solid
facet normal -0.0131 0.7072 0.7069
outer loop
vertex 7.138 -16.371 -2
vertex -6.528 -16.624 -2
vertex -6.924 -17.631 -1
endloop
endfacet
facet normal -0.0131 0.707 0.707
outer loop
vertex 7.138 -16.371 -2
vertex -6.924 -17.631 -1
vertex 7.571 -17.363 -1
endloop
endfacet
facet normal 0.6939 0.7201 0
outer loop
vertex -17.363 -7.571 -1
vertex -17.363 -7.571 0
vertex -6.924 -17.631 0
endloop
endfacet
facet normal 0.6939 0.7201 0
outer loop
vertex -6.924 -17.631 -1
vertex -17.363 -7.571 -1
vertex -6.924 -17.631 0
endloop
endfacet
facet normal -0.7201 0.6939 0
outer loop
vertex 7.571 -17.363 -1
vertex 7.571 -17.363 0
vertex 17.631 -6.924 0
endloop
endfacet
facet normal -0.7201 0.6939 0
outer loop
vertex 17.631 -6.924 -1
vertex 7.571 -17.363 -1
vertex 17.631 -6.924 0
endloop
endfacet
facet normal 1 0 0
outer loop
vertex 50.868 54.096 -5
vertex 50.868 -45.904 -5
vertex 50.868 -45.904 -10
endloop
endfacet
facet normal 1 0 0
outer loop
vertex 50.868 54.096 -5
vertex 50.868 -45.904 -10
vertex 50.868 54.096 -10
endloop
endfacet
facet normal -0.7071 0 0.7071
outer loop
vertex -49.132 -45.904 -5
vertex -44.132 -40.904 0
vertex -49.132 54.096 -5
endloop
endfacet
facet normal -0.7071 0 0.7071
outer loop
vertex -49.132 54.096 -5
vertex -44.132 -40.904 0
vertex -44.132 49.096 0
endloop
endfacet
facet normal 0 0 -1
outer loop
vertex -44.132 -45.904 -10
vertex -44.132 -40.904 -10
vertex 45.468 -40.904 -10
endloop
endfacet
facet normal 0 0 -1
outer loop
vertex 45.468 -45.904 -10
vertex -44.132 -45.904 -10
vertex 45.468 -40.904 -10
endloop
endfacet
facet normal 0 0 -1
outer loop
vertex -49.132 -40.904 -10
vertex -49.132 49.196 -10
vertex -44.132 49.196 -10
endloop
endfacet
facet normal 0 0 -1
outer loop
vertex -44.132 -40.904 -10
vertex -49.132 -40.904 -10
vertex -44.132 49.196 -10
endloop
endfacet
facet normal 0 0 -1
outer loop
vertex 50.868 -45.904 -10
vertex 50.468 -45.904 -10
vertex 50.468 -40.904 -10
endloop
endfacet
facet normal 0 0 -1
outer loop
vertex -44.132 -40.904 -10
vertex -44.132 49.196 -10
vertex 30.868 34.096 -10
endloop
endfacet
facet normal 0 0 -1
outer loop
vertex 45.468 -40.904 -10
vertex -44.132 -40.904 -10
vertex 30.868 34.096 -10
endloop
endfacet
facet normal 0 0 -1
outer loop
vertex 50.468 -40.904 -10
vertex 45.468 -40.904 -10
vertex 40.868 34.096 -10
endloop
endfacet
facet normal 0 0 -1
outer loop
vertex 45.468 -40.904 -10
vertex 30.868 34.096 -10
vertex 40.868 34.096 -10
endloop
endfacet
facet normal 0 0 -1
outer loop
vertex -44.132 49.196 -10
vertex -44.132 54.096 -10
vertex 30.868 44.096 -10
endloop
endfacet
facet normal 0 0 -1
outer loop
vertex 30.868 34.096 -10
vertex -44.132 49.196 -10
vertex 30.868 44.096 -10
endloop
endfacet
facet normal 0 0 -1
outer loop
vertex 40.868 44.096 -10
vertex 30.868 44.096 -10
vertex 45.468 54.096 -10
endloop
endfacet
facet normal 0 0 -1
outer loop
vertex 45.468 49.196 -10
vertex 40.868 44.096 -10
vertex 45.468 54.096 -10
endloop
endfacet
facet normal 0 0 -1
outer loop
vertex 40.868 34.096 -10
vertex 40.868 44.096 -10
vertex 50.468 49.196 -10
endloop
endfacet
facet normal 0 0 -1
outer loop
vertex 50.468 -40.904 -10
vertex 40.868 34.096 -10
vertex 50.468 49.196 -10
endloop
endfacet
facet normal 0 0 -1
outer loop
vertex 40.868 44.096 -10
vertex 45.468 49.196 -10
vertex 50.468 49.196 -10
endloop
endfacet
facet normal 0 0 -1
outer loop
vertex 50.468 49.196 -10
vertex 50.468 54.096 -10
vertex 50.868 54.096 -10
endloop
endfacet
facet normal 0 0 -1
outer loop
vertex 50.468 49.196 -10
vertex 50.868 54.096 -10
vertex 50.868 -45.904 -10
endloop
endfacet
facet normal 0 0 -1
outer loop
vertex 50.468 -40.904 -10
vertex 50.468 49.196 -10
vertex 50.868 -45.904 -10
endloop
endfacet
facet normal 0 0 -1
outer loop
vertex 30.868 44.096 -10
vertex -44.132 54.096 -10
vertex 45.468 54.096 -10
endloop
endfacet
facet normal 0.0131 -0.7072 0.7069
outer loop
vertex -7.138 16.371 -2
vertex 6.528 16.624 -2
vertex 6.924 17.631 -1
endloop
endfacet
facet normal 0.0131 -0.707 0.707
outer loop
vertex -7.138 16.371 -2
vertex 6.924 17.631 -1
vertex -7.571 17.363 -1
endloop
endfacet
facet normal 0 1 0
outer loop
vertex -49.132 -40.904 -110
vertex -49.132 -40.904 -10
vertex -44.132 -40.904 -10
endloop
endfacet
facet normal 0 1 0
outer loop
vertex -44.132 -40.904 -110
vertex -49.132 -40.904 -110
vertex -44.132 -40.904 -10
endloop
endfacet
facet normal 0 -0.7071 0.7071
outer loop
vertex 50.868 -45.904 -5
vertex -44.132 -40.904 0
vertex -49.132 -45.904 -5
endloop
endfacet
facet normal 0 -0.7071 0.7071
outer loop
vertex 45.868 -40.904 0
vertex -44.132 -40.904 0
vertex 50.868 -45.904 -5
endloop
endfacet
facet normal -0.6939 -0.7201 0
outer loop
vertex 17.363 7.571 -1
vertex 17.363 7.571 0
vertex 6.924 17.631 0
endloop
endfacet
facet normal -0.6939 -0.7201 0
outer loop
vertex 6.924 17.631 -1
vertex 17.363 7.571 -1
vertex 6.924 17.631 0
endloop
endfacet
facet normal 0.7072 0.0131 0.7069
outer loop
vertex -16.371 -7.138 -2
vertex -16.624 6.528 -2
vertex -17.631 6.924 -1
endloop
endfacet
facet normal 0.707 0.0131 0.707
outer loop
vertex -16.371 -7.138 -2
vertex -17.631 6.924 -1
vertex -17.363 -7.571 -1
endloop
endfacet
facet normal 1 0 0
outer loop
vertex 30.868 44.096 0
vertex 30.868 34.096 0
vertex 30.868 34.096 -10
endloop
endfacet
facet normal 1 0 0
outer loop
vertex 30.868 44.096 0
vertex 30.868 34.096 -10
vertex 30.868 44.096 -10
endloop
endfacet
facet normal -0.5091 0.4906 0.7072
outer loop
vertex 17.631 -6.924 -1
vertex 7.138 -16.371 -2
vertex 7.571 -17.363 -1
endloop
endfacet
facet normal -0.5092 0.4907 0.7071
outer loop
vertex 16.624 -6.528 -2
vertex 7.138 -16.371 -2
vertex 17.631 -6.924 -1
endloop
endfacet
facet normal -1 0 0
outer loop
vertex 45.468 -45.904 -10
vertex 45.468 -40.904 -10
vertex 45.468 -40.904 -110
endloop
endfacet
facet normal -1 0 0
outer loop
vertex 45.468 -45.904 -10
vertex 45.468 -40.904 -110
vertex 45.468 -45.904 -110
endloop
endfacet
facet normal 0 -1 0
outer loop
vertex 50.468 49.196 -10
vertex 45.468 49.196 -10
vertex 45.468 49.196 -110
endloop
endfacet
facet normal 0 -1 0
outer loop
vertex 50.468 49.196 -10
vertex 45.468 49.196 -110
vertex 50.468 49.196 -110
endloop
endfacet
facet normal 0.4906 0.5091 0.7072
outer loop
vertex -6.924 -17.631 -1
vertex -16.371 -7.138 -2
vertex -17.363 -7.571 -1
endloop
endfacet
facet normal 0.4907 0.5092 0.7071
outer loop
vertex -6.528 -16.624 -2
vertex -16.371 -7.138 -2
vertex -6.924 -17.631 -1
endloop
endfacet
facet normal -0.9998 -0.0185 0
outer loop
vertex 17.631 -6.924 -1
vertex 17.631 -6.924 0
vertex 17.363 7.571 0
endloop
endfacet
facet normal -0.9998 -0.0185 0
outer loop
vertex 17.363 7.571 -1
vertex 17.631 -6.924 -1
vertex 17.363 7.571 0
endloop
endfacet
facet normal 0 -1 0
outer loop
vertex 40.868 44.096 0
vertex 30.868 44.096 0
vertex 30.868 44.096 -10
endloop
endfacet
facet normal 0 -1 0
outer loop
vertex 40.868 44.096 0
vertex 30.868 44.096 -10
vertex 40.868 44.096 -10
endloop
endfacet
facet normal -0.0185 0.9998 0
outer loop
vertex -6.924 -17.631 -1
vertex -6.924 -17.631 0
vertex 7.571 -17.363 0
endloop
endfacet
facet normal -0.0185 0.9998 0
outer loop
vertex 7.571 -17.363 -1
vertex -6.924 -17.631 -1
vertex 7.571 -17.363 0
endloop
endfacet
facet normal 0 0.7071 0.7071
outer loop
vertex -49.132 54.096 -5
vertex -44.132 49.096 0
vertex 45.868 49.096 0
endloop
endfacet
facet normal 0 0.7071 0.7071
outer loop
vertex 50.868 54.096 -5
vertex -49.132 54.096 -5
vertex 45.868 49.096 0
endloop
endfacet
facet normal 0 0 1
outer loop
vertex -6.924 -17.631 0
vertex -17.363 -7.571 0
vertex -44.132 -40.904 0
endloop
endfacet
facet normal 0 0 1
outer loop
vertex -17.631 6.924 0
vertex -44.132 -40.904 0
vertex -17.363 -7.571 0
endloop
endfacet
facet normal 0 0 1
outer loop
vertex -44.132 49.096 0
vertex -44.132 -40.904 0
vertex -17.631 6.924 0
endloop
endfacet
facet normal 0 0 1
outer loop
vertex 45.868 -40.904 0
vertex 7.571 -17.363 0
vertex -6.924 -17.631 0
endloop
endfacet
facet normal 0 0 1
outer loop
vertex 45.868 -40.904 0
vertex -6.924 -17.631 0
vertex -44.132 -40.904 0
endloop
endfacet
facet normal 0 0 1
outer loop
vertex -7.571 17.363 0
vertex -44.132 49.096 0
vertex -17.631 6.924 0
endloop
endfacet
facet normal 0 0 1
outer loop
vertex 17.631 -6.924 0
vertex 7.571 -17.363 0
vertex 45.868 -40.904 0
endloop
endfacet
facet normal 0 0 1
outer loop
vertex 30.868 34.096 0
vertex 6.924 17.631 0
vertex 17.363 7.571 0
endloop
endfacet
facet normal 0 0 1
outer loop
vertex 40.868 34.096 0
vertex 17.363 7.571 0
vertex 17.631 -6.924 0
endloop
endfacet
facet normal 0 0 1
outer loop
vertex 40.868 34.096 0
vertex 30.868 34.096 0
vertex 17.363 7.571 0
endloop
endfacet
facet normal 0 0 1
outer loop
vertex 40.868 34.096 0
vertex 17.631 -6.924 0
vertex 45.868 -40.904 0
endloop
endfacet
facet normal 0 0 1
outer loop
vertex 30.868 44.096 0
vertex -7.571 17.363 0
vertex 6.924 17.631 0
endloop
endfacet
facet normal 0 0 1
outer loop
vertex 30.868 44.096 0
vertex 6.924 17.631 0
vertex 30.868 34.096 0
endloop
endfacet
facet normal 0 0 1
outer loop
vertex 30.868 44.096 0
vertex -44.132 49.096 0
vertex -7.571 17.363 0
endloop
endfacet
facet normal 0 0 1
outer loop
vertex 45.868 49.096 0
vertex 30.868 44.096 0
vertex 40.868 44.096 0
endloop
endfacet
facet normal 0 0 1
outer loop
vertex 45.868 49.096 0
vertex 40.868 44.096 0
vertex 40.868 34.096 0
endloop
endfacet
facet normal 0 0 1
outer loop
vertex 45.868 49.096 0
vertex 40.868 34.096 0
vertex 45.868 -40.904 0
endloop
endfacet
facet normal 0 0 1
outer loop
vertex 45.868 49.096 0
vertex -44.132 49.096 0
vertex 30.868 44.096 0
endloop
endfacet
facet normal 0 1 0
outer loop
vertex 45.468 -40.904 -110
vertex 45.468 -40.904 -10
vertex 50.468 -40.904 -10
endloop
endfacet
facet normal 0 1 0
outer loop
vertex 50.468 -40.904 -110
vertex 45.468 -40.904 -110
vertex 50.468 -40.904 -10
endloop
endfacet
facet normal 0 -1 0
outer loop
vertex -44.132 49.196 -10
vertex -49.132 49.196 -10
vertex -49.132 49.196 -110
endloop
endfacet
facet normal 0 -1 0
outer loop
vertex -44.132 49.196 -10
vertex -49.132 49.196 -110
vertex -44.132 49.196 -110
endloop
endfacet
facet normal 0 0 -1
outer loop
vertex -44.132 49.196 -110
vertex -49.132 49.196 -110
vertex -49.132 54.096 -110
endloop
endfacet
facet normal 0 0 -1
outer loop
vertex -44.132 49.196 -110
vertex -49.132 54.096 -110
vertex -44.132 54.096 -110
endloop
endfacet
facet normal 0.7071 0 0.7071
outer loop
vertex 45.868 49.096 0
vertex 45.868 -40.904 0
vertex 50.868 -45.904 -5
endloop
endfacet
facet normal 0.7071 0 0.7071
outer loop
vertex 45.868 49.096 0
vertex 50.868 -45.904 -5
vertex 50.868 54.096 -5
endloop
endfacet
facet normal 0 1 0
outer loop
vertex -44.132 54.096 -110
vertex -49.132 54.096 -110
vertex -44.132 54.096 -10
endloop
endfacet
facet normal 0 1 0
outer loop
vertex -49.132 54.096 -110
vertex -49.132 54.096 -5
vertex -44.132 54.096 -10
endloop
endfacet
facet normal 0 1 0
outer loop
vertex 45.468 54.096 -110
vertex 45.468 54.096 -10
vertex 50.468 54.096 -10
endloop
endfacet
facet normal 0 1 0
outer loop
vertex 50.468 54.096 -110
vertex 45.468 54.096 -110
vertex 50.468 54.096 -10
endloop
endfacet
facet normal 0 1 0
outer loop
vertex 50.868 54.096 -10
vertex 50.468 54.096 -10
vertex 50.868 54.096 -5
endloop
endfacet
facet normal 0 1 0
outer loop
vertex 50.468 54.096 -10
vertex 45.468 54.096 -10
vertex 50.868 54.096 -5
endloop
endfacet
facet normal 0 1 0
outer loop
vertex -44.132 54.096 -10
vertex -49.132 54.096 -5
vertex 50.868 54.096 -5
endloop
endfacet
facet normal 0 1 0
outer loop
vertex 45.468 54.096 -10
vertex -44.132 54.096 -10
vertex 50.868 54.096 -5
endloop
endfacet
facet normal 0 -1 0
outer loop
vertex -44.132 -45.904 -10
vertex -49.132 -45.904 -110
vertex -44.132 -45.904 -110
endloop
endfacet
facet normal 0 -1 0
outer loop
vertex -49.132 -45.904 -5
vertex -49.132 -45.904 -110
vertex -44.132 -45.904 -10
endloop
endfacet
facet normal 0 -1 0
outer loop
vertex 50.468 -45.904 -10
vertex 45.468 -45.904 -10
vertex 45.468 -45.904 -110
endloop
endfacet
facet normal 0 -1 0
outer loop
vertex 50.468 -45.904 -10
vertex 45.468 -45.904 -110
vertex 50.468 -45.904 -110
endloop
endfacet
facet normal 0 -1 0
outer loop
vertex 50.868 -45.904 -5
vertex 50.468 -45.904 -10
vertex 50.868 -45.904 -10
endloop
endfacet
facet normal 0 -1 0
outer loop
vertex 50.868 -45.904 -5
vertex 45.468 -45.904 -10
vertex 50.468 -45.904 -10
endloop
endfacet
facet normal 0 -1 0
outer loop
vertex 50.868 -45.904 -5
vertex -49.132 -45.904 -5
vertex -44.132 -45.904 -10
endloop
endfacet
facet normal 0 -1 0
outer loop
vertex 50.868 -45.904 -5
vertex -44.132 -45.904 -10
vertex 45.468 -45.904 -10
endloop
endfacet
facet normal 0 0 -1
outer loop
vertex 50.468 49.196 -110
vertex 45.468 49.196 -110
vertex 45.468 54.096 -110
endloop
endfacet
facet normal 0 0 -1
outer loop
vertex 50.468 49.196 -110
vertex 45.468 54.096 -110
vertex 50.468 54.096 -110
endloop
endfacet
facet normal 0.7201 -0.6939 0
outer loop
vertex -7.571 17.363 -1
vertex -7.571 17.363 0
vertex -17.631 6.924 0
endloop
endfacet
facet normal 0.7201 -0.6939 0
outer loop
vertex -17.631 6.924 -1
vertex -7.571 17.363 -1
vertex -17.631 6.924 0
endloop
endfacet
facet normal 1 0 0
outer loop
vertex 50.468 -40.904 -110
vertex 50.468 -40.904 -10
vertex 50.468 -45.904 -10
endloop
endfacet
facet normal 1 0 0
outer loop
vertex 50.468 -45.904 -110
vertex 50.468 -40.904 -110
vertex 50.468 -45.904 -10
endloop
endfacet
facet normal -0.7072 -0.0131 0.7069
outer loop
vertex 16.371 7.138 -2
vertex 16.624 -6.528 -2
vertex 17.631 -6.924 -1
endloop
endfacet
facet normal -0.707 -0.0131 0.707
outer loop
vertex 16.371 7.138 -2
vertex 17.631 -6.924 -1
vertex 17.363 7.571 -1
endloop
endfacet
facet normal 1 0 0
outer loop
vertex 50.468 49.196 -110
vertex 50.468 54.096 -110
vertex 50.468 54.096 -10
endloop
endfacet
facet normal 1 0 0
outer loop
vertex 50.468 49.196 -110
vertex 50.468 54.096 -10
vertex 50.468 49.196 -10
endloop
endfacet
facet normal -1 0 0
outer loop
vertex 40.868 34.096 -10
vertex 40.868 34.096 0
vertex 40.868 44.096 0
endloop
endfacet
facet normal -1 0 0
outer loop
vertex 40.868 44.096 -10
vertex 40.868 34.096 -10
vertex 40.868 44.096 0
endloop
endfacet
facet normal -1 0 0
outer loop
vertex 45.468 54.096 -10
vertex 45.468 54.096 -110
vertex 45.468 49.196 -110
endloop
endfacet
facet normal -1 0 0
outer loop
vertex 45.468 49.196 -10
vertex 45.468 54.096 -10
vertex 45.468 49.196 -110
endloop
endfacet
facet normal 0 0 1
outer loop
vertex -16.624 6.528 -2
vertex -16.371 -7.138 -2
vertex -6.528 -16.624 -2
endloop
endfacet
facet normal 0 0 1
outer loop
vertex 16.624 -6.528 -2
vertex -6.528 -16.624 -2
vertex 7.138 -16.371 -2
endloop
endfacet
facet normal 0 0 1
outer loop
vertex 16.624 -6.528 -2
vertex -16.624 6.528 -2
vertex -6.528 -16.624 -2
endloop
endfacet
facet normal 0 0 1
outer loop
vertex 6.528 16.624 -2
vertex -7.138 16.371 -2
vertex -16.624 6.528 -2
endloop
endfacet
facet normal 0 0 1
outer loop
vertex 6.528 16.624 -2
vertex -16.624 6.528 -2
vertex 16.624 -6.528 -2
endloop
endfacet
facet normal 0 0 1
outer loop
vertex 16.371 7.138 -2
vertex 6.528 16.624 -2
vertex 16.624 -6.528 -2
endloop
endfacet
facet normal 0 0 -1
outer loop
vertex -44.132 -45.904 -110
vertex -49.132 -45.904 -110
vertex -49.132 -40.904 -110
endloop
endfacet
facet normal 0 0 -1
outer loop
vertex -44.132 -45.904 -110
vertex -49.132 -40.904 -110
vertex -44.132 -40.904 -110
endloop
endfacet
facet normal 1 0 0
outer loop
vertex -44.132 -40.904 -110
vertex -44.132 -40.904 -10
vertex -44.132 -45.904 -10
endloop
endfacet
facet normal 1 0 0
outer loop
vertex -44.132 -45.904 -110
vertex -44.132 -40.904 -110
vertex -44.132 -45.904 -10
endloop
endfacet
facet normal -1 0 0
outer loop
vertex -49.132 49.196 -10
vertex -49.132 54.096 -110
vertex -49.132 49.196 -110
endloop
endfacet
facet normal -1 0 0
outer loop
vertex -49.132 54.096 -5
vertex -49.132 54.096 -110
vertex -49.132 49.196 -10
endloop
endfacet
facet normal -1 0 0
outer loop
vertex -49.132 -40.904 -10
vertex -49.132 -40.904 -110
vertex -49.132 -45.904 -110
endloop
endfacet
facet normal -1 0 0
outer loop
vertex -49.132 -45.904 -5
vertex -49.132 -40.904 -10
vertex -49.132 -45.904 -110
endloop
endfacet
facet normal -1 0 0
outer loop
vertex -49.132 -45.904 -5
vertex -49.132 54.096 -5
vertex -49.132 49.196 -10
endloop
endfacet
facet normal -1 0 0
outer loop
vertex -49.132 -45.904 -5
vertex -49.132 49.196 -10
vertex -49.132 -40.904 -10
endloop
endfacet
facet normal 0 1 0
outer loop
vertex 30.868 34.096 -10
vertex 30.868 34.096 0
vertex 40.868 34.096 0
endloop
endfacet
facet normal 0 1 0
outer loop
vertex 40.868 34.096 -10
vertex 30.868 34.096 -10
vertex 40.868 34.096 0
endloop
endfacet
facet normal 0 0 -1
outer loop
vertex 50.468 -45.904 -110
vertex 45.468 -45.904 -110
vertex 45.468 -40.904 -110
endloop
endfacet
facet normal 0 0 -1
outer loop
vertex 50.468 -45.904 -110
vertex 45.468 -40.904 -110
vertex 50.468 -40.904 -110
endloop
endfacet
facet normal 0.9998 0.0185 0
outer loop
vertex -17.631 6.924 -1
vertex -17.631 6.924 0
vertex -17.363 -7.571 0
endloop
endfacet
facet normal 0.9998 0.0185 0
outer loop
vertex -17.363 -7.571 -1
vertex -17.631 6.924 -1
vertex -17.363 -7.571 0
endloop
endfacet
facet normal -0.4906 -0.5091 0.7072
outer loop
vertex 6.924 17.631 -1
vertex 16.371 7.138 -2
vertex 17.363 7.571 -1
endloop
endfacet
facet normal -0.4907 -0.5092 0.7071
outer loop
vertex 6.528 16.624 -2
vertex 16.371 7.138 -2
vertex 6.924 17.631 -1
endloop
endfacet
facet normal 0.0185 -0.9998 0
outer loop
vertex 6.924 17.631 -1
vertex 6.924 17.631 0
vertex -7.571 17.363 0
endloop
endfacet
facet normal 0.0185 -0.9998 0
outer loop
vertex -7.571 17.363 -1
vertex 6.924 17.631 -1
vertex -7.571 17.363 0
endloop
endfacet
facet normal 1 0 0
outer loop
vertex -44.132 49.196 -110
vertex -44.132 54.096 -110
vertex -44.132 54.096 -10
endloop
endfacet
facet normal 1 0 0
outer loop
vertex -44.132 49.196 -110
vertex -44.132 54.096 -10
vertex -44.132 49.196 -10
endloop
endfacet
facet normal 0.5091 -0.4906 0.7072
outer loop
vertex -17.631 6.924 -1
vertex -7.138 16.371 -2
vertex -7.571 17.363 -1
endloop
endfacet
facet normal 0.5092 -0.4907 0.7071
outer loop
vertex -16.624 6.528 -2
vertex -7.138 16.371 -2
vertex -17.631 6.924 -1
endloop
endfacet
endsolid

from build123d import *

# Parameters (mm, degrees)
F0_W     = 100
F0_H     = 100
F2_DEPTH = 10
F4_SIZE2 = 5
F4_SIZE  = 5
F3_W     = 10
F3_H     = 10
F5_DEPTH = 34
F6_DEPTH = 2
F7_SIZE  = 1
F8_W     = 5
F8_H     = 4.9
F8_H_2   = 5
F9_DEPTH = 100


with BuildPart() as f2:
    # F0 (on Top) → F2 (new body)
    with BuildSketch(Plane.XY):
        with Locations((0.868328, 4.095532)):
            Rectangle(F0_W, F0_H)
    extrude(amount=-F2_DEPTH)

    # F4
    f4_edges = [f2.edges().sort_by_distance(p)[0] for p in [
        (0.868328, -45.904468, 0),
        (-49.131672, 4.095532, 0),
        (0.868328, 54.095532, 0),
        (50.868328, 4.095532, 0),
    ]]
    chamfer(f4_edges, length=F4_SIZE, length2=F4_SIZE2)

    # F3 (on face) → F5 (cut)
    with BuildSketch(Plane.XY):
        with Locations((35.868328, 39.095532)):
            Rectangle(F3_W, F3_H)
    extrude(amount=-F5_DEPTH, mode=Mode.SUBTRACT)

    # F1 (on face) → F6 (cut)
    with BuildSketch(Plane.XY):
        Polygon((-7.571068, 17.362981), (-17.631035, 6.923928), (-17.362981, -7.571068), (-6.923928, -17.631035), (7.571068, -17.362981), (17.631035, -6.923928), (17.362981, 7.571068), (6.923928, 17.631035), align=None)
    extrude(amount=-F6_DEPTH, mode=Mode.SUBTRACT)

    # F7
    f7_edges = [f2.edges().sort_by_distance(p)[0] for p in [
        (12.143455, 12.601052, -2),
        (-0.32357, 17.497008, -2),
        (-12.601052, 12.143455, -2),
        (-17.497008, -0.32357, -2),
        (-12.143455, -12.601052, -2),
        (0.32357, -17.497008, -2),
        (12.601052, -12.143455, -2),
        (17.497008, 0.32357, -2),
    ]]
    chamfer(f7_edges, length=F7_SIZE)

    # F8 (on face) → F9 (join)
    with BuildSketch(Plane(origin=(0, 0, -10), x_dir=(1, 0, 0), z_dir=(0, 0, -1))):
        with Locations((-46.631672, -51.645532)):
            Rectangle(F8_W, F8_H)
        with Locations((-46.631672, 43.404468)):
            Rectangle(F8_W, F8_H_2)
        with Locations((47.968328, -51.645532)):
            Rectangle(F8_W, F8_H)
        with Locations((47.968328, 43.404468)):
            Rectangle(F8_W, F8_H_2)
    extrude(amount=F9_DEPTH)


solid = f2.part
